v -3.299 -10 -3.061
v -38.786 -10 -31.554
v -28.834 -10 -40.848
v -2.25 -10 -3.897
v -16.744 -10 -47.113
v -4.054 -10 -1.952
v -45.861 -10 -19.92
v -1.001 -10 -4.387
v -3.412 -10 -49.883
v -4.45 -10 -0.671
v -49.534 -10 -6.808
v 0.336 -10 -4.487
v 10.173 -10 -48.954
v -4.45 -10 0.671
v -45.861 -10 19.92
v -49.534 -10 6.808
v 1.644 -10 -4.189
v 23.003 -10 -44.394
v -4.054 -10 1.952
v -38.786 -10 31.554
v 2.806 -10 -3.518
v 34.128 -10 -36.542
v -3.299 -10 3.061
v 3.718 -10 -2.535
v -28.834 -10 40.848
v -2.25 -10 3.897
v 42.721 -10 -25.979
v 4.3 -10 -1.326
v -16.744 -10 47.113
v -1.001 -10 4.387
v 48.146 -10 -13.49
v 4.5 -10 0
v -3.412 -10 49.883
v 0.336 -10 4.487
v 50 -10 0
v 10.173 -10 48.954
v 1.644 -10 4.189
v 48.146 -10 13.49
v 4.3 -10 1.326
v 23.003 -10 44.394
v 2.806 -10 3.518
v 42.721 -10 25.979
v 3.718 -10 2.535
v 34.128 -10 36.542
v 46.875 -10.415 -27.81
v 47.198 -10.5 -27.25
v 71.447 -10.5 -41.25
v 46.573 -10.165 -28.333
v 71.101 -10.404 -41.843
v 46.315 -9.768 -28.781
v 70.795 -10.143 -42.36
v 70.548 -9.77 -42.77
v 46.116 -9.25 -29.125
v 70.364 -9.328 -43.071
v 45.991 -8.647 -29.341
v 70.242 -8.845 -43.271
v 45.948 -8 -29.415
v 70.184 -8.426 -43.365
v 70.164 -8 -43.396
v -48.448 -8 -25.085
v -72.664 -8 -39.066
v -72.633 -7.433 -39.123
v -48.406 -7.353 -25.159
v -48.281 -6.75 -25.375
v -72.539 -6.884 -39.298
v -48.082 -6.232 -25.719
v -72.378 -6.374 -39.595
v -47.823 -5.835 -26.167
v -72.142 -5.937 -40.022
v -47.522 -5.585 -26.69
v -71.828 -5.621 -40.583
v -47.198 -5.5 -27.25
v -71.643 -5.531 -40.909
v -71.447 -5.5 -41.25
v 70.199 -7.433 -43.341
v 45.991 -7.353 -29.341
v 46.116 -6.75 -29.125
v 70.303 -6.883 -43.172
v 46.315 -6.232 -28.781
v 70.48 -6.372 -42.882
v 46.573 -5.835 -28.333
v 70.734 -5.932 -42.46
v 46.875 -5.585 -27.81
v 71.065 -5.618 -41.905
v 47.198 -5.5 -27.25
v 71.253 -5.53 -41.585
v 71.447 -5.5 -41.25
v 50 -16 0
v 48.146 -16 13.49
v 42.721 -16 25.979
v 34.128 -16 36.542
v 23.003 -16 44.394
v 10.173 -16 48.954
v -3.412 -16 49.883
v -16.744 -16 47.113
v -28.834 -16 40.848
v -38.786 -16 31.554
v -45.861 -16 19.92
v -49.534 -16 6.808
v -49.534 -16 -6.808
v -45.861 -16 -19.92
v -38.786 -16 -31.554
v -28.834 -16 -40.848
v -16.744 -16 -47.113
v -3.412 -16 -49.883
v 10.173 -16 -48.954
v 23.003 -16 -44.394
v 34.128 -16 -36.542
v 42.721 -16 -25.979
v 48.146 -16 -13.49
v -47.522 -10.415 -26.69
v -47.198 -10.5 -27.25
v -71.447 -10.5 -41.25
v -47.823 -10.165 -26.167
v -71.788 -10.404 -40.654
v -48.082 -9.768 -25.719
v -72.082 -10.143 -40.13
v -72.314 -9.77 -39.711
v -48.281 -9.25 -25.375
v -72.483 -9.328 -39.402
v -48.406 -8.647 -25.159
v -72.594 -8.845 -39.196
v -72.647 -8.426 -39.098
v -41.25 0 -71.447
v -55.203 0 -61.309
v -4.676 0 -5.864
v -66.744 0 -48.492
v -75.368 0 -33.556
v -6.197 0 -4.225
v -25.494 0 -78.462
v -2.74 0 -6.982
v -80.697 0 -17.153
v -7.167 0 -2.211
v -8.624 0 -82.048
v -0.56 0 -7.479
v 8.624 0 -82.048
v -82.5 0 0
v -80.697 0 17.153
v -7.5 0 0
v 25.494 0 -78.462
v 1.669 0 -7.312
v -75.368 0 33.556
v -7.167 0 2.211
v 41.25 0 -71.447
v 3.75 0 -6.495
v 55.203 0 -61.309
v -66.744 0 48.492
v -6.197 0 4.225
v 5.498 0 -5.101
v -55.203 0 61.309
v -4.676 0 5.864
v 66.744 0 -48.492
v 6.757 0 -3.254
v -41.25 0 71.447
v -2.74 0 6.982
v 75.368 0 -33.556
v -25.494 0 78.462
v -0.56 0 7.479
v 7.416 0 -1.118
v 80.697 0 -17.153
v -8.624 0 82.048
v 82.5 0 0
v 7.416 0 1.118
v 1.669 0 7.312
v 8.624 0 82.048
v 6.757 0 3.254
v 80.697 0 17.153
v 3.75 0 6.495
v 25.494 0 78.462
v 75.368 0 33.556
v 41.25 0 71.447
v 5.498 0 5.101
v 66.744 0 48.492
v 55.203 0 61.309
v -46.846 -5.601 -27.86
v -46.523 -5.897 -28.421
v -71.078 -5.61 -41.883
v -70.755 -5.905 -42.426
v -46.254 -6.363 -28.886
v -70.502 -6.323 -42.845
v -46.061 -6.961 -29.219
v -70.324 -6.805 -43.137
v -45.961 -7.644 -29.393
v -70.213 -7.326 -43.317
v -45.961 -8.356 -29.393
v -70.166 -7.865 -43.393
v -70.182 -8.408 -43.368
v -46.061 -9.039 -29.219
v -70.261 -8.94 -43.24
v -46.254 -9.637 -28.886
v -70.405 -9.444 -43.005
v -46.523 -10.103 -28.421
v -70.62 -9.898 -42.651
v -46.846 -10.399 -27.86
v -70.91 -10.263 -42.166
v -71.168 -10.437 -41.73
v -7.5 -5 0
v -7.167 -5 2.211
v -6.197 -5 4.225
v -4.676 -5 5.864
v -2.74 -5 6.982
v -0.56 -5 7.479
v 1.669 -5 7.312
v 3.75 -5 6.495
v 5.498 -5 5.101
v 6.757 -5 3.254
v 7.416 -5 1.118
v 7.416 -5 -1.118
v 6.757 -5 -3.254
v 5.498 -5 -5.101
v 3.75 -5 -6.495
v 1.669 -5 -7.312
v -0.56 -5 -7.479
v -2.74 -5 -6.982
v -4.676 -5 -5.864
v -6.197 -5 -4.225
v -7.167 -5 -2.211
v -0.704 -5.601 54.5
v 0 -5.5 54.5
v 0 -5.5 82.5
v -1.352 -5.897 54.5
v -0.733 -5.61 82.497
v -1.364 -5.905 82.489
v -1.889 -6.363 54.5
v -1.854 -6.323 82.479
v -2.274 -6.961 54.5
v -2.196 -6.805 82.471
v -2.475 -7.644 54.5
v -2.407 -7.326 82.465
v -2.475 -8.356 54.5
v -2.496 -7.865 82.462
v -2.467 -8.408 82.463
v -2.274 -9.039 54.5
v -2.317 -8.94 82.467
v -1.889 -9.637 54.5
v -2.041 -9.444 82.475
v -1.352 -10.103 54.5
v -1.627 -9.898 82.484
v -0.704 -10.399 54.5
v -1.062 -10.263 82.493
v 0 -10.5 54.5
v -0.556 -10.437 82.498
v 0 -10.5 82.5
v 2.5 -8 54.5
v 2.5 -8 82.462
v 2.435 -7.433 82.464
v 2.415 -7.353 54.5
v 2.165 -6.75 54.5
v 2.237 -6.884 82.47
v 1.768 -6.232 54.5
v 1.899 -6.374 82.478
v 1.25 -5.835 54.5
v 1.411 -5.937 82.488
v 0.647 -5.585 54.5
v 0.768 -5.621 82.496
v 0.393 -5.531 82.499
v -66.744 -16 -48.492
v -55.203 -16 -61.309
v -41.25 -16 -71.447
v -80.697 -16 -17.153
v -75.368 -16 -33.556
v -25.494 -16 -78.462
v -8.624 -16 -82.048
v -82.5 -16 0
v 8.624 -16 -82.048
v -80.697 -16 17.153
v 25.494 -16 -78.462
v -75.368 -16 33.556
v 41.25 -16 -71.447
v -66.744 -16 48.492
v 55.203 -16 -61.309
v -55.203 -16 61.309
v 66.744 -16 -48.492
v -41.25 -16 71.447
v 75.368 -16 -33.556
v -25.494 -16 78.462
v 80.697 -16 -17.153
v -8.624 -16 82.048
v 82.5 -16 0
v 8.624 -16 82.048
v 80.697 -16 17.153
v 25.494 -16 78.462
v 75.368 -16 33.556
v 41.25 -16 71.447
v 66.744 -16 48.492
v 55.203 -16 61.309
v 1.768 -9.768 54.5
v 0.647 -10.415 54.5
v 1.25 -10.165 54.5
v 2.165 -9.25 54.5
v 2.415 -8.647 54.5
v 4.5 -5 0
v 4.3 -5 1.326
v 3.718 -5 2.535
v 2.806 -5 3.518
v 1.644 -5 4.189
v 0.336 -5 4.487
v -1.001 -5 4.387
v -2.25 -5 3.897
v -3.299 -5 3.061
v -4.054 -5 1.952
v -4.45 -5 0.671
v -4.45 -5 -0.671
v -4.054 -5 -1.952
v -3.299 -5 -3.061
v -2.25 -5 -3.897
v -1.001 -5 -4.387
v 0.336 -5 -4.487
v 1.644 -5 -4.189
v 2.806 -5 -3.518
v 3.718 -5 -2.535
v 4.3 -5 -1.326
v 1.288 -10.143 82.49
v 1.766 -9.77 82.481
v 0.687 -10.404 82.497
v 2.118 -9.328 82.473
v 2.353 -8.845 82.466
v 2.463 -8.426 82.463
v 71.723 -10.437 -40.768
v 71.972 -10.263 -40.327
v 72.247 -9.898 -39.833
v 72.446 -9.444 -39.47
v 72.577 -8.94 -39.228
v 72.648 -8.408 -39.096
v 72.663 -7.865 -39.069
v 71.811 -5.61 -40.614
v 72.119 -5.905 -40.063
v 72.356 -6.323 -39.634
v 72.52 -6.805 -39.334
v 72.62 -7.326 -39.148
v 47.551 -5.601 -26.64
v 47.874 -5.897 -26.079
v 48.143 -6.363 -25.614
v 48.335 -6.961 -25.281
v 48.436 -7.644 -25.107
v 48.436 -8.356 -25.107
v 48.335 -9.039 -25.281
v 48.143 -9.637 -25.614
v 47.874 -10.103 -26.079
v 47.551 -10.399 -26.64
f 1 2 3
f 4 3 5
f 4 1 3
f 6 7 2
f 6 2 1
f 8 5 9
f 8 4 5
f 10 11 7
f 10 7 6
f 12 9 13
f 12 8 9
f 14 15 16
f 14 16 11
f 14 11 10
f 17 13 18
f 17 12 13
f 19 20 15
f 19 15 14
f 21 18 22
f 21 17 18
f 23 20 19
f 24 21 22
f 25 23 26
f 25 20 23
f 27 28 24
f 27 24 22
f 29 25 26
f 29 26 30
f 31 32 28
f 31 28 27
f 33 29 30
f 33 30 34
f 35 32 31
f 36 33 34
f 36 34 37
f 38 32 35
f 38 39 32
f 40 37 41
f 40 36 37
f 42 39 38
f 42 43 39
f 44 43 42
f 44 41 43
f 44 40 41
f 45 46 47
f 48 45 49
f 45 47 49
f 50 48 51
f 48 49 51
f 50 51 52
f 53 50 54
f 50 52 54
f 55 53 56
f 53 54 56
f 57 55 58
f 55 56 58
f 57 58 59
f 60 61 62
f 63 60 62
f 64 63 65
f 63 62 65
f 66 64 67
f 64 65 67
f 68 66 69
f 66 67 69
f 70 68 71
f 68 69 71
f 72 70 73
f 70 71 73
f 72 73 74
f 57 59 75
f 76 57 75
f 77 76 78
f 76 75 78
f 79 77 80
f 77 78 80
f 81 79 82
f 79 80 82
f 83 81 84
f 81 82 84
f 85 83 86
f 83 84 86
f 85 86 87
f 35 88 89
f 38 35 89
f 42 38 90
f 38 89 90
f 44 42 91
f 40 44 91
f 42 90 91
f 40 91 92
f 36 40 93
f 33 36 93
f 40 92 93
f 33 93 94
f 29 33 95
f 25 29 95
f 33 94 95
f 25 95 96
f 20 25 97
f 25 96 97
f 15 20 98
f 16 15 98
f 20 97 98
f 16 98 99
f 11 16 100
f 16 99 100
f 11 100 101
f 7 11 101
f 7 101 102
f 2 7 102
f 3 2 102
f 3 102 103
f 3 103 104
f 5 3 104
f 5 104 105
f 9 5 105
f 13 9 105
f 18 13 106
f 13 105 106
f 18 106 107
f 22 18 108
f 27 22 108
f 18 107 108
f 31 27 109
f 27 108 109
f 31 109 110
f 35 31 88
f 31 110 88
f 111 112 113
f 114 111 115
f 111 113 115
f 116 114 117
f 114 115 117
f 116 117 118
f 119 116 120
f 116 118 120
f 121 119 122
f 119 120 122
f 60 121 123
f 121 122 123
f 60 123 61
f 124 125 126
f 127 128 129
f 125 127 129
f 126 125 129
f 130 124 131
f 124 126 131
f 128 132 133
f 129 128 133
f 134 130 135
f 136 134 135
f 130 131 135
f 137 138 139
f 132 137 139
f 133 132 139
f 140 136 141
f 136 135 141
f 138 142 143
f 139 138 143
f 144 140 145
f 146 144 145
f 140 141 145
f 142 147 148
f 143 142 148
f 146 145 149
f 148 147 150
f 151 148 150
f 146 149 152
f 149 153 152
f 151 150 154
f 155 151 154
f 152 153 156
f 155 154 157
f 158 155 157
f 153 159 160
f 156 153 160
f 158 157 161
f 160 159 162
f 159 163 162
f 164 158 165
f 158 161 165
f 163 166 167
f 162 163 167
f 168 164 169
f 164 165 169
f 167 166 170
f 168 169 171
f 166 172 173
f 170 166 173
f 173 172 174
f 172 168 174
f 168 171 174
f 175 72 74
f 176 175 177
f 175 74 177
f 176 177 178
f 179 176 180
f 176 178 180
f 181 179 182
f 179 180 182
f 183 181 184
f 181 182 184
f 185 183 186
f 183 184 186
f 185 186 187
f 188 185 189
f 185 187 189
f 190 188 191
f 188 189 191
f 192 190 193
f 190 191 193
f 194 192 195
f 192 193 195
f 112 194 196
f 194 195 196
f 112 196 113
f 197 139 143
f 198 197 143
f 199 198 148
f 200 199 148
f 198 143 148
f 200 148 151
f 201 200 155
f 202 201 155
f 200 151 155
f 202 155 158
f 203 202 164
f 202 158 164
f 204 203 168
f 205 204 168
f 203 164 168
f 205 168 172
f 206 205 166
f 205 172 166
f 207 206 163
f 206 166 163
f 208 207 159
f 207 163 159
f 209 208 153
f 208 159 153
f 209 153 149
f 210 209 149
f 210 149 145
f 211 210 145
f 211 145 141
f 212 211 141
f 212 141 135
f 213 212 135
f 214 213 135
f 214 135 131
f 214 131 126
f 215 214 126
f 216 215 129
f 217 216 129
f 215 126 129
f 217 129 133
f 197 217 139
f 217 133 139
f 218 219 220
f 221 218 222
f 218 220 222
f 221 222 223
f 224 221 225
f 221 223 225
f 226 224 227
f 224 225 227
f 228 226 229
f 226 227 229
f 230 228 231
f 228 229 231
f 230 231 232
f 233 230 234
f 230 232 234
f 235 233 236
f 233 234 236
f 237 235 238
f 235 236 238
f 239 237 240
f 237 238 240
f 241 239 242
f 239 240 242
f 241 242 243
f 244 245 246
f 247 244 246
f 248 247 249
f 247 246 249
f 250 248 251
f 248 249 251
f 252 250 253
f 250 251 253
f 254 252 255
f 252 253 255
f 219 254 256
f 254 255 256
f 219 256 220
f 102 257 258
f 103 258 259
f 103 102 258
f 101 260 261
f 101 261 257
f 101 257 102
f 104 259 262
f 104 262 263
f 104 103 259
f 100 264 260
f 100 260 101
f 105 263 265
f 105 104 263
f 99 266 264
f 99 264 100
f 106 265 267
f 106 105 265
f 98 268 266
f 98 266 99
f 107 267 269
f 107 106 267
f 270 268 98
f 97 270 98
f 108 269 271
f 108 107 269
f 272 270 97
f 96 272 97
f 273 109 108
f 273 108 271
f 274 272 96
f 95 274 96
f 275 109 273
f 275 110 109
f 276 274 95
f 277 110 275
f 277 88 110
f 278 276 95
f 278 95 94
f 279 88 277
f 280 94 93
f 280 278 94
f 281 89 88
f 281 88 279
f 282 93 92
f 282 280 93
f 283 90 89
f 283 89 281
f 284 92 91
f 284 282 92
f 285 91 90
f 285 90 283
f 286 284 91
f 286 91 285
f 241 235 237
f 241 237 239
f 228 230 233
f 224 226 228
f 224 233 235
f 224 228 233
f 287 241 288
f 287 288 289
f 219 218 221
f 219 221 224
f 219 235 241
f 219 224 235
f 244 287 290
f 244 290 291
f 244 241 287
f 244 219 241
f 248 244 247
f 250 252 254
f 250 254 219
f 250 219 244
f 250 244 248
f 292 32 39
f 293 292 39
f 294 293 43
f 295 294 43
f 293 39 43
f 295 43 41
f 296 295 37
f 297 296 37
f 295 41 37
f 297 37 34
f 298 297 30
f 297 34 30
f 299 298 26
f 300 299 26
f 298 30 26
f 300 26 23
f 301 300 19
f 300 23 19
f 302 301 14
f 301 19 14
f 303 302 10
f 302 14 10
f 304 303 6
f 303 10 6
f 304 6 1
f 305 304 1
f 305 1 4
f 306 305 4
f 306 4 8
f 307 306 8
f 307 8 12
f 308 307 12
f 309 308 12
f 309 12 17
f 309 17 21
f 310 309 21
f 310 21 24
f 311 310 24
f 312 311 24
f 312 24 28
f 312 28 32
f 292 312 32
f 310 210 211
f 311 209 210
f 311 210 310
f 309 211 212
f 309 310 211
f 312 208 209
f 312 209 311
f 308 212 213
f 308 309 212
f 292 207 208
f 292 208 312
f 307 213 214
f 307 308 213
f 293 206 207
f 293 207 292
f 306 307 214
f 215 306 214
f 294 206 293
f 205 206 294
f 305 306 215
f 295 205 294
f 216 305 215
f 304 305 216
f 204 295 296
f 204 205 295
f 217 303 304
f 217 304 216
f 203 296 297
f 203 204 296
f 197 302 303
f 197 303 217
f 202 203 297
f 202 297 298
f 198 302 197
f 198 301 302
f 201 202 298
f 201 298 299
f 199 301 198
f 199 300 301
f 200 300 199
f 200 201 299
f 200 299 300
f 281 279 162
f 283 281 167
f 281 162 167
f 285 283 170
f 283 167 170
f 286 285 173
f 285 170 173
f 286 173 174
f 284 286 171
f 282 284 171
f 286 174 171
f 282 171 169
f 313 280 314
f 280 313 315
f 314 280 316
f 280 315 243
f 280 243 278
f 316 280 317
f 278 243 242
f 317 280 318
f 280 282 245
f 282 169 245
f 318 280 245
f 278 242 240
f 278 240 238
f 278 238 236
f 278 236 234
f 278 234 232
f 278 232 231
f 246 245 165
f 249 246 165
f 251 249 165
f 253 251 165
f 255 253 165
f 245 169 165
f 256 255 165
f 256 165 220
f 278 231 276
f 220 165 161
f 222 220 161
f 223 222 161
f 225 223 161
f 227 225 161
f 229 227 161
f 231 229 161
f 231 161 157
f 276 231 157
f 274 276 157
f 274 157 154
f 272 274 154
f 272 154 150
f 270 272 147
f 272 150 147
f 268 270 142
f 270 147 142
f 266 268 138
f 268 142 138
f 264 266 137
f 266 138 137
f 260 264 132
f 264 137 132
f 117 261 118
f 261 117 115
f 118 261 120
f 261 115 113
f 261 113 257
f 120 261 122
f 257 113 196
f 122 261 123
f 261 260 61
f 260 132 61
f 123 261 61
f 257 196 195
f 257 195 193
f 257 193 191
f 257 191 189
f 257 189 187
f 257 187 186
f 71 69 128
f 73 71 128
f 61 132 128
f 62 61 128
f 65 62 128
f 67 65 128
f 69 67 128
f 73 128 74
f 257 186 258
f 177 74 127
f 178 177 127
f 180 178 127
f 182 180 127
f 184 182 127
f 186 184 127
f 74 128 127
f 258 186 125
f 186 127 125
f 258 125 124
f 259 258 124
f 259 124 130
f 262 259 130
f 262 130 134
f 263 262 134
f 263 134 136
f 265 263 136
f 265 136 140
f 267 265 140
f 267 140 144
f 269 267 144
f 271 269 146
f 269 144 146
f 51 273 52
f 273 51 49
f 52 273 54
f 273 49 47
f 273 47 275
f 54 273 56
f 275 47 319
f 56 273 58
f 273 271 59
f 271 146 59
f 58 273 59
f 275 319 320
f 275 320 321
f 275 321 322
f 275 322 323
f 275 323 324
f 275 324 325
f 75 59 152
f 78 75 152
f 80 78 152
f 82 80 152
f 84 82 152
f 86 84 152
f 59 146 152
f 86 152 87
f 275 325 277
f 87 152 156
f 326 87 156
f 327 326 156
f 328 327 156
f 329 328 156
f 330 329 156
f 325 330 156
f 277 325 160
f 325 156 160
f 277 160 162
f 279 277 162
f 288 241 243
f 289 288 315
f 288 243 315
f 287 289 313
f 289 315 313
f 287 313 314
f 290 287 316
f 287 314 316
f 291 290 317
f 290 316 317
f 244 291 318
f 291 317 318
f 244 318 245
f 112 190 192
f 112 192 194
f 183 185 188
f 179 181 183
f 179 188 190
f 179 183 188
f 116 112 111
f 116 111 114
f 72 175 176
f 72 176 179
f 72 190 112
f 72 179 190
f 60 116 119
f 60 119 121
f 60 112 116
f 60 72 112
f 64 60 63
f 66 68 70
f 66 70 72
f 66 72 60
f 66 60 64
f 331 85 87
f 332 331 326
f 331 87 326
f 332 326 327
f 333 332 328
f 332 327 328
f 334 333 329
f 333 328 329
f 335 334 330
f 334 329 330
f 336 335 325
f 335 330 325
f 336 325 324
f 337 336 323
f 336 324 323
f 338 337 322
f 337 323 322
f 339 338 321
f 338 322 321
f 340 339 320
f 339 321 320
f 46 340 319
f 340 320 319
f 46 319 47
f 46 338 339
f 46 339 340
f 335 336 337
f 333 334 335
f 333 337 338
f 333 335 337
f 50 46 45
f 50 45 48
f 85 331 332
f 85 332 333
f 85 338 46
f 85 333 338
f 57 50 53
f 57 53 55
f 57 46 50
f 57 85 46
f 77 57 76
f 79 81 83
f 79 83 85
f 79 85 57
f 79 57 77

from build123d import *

# Parameters (mm, degrees)
F0_R            = 82.5
F1_DEPTH        = 16
F2_R            = 50
F3_DEPTH        = 6
F6_DEPTH        = 28
F6_COPIES_COUNT = 3
F7_R            = 4.5
F8_DEPTH        = 25
F9_R            = 7.5
F9_R_2          = 4.5
F10_DEPTH       = 5


# Not quite as in the source:
# - a pattern or mirror of a feature is missing from the dataset's text; its kind, count and spacing are read off the source's solid


with BuildPart() as f1:
    # F0 (on Front) → F1 (new body)
    with BuildSketch(Plane.XZ):
        Circle(F0_R)
    extrude(amount=F1_DEPTH)

    # F2 (on face) → F3 (cut)
    with BuildSketch(Plane.XZ.offset(16)):
        Circle(F2_R)
    extrude(amount=-F3_DEPTH, mode=Mode.SUBTRACT)

    # F5 (on offset) → F6 (cut)
    with BuildSketch(Plane.XY.offset(82.5)):
        with BuildLine():
            ThreePointArc((2.5, -8), (1.767766953, -6.232233047), (0, -5.5))
            Line((0, -5.5), (0, -10.5))
            ThreePointArc((0, -10.5), (1.767766953, -9.767766953), (2.5, -8))
        make_face()
        with BuildLine():
            Line((0, -10.5), (0, -5.5))
            ThreePointArc((0, -5.5), (-2.5, -8), (0, -10.5))
        make_face()
    f6 = extrude(amount=-F6_DEPTH, mode=Mode.SUBTRACT)

    # F6_copies: F6 ×3 about axis
    f6_copies_axis = Axis((0, 0, 0), (0, 1, 0))
    for i in range(1, F6_COPIES_COUNT):
        add(f6.rotate(f6_copies_axis, i * 360 / F6_COPIES_COUNT), mode=Mode.SUBTRACT)

    # F7 (on face) → F8 (cut)
    with BuildSketch(Plane.XZ.offset(10)):
        Circle(F7_R)
    extrude(amount=-F8_DEPTH, mode=Mode.SUBTRACT)

    # F9 (on face) → F10 (cut)
    with BuildSketch(Plane(origin=(0, 0, 0), x_dir=(-1, 0, 0), z_dir=(0, 1, 0))):
        Circle(F9_R)
        Circle(F9_R_2, mode=Mode.SUBTRACT)
    extrude(amount=-F10_DEPTH, mode=Mode.SUBTRACT)


solid = f1.part
